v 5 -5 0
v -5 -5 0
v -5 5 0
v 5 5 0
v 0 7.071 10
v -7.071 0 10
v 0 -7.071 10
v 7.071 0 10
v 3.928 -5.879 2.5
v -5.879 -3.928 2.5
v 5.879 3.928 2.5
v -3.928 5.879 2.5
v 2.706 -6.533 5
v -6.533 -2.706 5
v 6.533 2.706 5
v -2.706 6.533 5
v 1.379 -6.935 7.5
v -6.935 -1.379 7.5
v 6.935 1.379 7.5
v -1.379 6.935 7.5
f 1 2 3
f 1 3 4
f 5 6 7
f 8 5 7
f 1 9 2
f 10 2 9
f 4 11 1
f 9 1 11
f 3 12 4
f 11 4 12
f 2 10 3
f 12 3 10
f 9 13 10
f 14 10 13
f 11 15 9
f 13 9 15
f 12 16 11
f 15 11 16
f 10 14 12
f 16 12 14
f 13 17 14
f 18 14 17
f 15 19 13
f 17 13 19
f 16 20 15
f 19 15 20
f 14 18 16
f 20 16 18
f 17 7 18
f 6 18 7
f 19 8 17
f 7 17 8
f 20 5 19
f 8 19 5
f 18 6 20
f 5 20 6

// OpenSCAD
linear_extrude(height=10, twist=45, slices=0) square(10,center=true);
